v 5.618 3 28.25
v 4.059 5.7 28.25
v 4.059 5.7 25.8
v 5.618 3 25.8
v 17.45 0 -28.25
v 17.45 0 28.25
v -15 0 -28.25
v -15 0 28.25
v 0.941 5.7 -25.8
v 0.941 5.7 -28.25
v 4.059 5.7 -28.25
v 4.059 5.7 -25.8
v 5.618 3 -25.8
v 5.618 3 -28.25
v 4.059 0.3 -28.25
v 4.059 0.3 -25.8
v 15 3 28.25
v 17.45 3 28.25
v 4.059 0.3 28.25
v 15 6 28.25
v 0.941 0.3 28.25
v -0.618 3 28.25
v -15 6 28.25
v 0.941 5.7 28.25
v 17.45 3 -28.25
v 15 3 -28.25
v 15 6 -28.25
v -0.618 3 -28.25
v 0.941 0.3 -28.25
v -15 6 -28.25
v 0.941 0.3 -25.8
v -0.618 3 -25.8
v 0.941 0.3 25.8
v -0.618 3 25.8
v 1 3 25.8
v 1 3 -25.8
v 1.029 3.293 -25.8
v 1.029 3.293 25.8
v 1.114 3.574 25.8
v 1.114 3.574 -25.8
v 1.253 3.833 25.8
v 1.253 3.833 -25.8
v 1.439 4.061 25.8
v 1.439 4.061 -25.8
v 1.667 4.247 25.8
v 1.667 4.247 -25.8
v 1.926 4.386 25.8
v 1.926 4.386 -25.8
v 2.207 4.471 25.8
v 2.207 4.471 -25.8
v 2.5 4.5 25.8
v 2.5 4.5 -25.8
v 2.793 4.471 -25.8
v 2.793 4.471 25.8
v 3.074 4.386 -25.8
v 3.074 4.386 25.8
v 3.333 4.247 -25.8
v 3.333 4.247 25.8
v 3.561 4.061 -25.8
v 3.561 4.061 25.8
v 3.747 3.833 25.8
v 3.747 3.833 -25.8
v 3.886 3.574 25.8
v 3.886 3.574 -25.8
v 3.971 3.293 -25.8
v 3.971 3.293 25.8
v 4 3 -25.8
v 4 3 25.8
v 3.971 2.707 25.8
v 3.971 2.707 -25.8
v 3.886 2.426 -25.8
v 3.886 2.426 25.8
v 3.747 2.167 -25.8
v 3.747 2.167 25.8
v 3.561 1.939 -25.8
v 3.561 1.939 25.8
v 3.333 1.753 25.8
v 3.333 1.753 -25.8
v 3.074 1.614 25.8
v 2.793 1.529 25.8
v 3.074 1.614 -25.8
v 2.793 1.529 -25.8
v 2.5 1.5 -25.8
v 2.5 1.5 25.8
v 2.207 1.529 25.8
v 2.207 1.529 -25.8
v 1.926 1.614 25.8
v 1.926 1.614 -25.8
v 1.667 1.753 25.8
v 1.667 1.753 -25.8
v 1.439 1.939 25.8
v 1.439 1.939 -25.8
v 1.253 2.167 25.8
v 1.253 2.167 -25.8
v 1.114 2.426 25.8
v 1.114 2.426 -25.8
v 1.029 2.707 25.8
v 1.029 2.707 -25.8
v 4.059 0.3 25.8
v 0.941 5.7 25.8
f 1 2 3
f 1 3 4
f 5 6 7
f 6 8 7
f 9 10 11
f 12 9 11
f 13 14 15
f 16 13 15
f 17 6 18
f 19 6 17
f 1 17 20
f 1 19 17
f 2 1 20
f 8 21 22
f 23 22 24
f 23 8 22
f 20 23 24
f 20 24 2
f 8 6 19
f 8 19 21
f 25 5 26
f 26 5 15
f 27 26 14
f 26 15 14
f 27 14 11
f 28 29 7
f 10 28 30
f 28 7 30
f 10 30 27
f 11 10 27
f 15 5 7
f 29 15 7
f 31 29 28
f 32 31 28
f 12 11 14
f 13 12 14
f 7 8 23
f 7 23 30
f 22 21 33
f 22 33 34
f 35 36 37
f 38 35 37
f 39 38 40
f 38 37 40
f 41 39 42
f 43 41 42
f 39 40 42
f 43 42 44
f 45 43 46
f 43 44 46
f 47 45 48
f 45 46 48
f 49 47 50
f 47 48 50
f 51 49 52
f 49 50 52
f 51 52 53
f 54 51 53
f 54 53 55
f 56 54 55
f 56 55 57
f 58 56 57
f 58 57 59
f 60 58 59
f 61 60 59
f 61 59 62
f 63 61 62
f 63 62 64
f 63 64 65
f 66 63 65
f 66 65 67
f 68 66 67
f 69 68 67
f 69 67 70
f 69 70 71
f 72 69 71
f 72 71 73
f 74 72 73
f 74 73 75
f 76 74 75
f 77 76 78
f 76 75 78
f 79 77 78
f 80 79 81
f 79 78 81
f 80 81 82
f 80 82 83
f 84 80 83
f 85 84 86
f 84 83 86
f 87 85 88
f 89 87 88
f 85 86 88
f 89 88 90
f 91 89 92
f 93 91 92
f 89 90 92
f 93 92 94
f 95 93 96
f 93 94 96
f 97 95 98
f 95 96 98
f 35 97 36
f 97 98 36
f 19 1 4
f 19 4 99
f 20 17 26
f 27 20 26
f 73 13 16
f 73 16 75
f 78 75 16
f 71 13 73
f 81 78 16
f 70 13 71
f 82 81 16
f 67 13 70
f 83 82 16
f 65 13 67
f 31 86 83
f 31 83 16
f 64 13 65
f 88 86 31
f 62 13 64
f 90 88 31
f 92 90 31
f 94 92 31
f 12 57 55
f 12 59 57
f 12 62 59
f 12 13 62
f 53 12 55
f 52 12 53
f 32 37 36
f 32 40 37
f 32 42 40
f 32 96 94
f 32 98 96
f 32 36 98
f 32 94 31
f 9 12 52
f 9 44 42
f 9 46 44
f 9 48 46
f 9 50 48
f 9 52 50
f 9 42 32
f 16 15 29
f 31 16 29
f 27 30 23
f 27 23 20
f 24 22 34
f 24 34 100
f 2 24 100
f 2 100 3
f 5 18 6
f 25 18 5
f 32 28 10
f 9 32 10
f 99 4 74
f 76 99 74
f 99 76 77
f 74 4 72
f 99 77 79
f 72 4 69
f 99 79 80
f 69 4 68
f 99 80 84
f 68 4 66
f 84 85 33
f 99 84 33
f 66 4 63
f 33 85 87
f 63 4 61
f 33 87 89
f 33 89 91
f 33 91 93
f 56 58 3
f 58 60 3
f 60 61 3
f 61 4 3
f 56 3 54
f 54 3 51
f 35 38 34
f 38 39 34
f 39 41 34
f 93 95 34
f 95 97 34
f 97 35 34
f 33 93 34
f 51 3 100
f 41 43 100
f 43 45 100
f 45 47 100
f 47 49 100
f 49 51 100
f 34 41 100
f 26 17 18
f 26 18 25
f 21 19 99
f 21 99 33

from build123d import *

# Parameters (mm, degrees)
SKETCH1_W           = 30
SKETCH1_H           = 56.5
BOSS_EXTRUDE1_DEPTH = 6
SKETCH8_W           = 56.5
SKETCH8_H           = 3
BOSS_EXTRUDE3_DEPTH = 2.45
SKETCH9_R           = 1.5
CUT_EXTRUDE3_DEPTH  = 60.436962406
CUT_EXTRUDE4_DEPTH  = 2.45


with BuildPart() as part:
    # Sketch1 → Boss-Extrude1 (new body)
    with BuildSketch(Plane(origin=(0, 0, 0), x_dir=(1, 0, 0), z_dir=(0, 1, 0))):
        Rectangle(SKETCH1_W, SKETCH1_H)
    extrude(amount=BOSS_EXTRUDE1_DEPTH)

    # Sketch8 → Boss-Extrude3 (add)
    with BuildSketch(Plane(origin=(15, 0, 0), x_dir=(0, 0, -1), z_dir=(1, 0, 0))):
        with Locations((0, 1.5)):
            Rectangle(SKETCH8_W, SKETCH8_H)
    extrude(amount=BOSS_EXTRUDE3_DEPTH)

    # Sketch9 → Cut-Extrude3 (cut, through all)
    with BuildSketch(Plane(origin=(0, 0, -28.25), x_dir=(-1, 0, 0), z_dir=(0, 0, -1))):
        with Locations((-2.5, 3)):
            Circle(SKETCH9_R)
    extrude(amount=-CUT_EXTRUDE3_DEPTH, mode=Mode.SUBTRACT)

    # Sketch10 → Cut-Extrude4 (cut)
    with BuildSketch(Plane(origin=(0, 0, -28.25), x_dir=(-1, 0, 0), z_dir=(0, 0, -1))):
        Polygon((-0.941154273, 0.3), (0.617691454, 3), (-0.941154273, 5.7), (-4.058845727, 5.7), (-5.617691454, 3), (-4.058845727, 0.3), align=None)
    cut_extrude4 = extrude(amount=-CUT_EXTRUDE4_DEPTH, mode=Mode.SUBTRACT)

    # Mirror2: Cut-Extrude4 across plane
    add(cut_extrude4.mirror(Plane.XY), mode=Mode.SUBTRACT)


solid = part.part
